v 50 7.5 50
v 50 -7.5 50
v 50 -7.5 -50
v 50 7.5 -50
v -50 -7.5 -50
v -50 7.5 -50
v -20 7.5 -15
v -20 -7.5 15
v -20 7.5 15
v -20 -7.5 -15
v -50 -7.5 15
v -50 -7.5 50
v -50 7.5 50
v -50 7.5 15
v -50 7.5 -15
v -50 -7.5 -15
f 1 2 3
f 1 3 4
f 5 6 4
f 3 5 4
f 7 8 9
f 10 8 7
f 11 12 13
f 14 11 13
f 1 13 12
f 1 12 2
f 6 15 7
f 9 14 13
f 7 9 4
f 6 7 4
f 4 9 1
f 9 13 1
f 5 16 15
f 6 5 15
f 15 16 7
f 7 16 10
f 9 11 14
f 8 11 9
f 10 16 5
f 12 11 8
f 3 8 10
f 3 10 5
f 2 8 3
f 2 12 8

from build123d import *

# Parameters (mm, degrees)
SKIZZE1_W                            = 100
SKIZZE1_H                            = 15
AUFSATZ_LINEAR_AUSTRAGEN1_DEPTH      = 50
SCHNITT_LINEAR_AUSTRAGEN1_DEPTH      = 72.107313267
SCHNITT_LINEAR_AUSTRAGEN1_DEPTH_BACK = 72.107313267
SKIZZE2_W                            = 30
SKIZZE2_H                            = 30


with BuildPart() as part:
    # Skizze1 → Aufsatz-Linear austragen1 (new, symmetric)
    with BuildSketch(Plane.XY):
        Rectangle(SKIZZE1_W, SKIZZE1_H)
    extrude(amount=AUFSATZ_LINEAR_AUSTRAGEN1_DEPTH, both=True)

    # Skizze2 → Schnitt-Linear austragen1 (cut, two sides: drawn at the far end of the back side and taken through both)
    with BuildSketch(Plane(origin=(0, 0, 0), x_dir=(1, 0, 0), z_dir=(0, 1, 0)).offset(-SCHNITT_LINEAR_AUSTRAGEN1_DEPTH_BACK)):
        with Locations((-35, 0)):
            Rectangle(SKIZZE2_W, SKIZZE2_H)
    extrude(amount=SCHNITT_LINEAR_AUSTRAGEN1_DEPTH + SCHNITT_LINEAR_AUSTRAGEN1_DEPTH_BACK, mode=Mode.SUBTRACT)


solid = part.part
